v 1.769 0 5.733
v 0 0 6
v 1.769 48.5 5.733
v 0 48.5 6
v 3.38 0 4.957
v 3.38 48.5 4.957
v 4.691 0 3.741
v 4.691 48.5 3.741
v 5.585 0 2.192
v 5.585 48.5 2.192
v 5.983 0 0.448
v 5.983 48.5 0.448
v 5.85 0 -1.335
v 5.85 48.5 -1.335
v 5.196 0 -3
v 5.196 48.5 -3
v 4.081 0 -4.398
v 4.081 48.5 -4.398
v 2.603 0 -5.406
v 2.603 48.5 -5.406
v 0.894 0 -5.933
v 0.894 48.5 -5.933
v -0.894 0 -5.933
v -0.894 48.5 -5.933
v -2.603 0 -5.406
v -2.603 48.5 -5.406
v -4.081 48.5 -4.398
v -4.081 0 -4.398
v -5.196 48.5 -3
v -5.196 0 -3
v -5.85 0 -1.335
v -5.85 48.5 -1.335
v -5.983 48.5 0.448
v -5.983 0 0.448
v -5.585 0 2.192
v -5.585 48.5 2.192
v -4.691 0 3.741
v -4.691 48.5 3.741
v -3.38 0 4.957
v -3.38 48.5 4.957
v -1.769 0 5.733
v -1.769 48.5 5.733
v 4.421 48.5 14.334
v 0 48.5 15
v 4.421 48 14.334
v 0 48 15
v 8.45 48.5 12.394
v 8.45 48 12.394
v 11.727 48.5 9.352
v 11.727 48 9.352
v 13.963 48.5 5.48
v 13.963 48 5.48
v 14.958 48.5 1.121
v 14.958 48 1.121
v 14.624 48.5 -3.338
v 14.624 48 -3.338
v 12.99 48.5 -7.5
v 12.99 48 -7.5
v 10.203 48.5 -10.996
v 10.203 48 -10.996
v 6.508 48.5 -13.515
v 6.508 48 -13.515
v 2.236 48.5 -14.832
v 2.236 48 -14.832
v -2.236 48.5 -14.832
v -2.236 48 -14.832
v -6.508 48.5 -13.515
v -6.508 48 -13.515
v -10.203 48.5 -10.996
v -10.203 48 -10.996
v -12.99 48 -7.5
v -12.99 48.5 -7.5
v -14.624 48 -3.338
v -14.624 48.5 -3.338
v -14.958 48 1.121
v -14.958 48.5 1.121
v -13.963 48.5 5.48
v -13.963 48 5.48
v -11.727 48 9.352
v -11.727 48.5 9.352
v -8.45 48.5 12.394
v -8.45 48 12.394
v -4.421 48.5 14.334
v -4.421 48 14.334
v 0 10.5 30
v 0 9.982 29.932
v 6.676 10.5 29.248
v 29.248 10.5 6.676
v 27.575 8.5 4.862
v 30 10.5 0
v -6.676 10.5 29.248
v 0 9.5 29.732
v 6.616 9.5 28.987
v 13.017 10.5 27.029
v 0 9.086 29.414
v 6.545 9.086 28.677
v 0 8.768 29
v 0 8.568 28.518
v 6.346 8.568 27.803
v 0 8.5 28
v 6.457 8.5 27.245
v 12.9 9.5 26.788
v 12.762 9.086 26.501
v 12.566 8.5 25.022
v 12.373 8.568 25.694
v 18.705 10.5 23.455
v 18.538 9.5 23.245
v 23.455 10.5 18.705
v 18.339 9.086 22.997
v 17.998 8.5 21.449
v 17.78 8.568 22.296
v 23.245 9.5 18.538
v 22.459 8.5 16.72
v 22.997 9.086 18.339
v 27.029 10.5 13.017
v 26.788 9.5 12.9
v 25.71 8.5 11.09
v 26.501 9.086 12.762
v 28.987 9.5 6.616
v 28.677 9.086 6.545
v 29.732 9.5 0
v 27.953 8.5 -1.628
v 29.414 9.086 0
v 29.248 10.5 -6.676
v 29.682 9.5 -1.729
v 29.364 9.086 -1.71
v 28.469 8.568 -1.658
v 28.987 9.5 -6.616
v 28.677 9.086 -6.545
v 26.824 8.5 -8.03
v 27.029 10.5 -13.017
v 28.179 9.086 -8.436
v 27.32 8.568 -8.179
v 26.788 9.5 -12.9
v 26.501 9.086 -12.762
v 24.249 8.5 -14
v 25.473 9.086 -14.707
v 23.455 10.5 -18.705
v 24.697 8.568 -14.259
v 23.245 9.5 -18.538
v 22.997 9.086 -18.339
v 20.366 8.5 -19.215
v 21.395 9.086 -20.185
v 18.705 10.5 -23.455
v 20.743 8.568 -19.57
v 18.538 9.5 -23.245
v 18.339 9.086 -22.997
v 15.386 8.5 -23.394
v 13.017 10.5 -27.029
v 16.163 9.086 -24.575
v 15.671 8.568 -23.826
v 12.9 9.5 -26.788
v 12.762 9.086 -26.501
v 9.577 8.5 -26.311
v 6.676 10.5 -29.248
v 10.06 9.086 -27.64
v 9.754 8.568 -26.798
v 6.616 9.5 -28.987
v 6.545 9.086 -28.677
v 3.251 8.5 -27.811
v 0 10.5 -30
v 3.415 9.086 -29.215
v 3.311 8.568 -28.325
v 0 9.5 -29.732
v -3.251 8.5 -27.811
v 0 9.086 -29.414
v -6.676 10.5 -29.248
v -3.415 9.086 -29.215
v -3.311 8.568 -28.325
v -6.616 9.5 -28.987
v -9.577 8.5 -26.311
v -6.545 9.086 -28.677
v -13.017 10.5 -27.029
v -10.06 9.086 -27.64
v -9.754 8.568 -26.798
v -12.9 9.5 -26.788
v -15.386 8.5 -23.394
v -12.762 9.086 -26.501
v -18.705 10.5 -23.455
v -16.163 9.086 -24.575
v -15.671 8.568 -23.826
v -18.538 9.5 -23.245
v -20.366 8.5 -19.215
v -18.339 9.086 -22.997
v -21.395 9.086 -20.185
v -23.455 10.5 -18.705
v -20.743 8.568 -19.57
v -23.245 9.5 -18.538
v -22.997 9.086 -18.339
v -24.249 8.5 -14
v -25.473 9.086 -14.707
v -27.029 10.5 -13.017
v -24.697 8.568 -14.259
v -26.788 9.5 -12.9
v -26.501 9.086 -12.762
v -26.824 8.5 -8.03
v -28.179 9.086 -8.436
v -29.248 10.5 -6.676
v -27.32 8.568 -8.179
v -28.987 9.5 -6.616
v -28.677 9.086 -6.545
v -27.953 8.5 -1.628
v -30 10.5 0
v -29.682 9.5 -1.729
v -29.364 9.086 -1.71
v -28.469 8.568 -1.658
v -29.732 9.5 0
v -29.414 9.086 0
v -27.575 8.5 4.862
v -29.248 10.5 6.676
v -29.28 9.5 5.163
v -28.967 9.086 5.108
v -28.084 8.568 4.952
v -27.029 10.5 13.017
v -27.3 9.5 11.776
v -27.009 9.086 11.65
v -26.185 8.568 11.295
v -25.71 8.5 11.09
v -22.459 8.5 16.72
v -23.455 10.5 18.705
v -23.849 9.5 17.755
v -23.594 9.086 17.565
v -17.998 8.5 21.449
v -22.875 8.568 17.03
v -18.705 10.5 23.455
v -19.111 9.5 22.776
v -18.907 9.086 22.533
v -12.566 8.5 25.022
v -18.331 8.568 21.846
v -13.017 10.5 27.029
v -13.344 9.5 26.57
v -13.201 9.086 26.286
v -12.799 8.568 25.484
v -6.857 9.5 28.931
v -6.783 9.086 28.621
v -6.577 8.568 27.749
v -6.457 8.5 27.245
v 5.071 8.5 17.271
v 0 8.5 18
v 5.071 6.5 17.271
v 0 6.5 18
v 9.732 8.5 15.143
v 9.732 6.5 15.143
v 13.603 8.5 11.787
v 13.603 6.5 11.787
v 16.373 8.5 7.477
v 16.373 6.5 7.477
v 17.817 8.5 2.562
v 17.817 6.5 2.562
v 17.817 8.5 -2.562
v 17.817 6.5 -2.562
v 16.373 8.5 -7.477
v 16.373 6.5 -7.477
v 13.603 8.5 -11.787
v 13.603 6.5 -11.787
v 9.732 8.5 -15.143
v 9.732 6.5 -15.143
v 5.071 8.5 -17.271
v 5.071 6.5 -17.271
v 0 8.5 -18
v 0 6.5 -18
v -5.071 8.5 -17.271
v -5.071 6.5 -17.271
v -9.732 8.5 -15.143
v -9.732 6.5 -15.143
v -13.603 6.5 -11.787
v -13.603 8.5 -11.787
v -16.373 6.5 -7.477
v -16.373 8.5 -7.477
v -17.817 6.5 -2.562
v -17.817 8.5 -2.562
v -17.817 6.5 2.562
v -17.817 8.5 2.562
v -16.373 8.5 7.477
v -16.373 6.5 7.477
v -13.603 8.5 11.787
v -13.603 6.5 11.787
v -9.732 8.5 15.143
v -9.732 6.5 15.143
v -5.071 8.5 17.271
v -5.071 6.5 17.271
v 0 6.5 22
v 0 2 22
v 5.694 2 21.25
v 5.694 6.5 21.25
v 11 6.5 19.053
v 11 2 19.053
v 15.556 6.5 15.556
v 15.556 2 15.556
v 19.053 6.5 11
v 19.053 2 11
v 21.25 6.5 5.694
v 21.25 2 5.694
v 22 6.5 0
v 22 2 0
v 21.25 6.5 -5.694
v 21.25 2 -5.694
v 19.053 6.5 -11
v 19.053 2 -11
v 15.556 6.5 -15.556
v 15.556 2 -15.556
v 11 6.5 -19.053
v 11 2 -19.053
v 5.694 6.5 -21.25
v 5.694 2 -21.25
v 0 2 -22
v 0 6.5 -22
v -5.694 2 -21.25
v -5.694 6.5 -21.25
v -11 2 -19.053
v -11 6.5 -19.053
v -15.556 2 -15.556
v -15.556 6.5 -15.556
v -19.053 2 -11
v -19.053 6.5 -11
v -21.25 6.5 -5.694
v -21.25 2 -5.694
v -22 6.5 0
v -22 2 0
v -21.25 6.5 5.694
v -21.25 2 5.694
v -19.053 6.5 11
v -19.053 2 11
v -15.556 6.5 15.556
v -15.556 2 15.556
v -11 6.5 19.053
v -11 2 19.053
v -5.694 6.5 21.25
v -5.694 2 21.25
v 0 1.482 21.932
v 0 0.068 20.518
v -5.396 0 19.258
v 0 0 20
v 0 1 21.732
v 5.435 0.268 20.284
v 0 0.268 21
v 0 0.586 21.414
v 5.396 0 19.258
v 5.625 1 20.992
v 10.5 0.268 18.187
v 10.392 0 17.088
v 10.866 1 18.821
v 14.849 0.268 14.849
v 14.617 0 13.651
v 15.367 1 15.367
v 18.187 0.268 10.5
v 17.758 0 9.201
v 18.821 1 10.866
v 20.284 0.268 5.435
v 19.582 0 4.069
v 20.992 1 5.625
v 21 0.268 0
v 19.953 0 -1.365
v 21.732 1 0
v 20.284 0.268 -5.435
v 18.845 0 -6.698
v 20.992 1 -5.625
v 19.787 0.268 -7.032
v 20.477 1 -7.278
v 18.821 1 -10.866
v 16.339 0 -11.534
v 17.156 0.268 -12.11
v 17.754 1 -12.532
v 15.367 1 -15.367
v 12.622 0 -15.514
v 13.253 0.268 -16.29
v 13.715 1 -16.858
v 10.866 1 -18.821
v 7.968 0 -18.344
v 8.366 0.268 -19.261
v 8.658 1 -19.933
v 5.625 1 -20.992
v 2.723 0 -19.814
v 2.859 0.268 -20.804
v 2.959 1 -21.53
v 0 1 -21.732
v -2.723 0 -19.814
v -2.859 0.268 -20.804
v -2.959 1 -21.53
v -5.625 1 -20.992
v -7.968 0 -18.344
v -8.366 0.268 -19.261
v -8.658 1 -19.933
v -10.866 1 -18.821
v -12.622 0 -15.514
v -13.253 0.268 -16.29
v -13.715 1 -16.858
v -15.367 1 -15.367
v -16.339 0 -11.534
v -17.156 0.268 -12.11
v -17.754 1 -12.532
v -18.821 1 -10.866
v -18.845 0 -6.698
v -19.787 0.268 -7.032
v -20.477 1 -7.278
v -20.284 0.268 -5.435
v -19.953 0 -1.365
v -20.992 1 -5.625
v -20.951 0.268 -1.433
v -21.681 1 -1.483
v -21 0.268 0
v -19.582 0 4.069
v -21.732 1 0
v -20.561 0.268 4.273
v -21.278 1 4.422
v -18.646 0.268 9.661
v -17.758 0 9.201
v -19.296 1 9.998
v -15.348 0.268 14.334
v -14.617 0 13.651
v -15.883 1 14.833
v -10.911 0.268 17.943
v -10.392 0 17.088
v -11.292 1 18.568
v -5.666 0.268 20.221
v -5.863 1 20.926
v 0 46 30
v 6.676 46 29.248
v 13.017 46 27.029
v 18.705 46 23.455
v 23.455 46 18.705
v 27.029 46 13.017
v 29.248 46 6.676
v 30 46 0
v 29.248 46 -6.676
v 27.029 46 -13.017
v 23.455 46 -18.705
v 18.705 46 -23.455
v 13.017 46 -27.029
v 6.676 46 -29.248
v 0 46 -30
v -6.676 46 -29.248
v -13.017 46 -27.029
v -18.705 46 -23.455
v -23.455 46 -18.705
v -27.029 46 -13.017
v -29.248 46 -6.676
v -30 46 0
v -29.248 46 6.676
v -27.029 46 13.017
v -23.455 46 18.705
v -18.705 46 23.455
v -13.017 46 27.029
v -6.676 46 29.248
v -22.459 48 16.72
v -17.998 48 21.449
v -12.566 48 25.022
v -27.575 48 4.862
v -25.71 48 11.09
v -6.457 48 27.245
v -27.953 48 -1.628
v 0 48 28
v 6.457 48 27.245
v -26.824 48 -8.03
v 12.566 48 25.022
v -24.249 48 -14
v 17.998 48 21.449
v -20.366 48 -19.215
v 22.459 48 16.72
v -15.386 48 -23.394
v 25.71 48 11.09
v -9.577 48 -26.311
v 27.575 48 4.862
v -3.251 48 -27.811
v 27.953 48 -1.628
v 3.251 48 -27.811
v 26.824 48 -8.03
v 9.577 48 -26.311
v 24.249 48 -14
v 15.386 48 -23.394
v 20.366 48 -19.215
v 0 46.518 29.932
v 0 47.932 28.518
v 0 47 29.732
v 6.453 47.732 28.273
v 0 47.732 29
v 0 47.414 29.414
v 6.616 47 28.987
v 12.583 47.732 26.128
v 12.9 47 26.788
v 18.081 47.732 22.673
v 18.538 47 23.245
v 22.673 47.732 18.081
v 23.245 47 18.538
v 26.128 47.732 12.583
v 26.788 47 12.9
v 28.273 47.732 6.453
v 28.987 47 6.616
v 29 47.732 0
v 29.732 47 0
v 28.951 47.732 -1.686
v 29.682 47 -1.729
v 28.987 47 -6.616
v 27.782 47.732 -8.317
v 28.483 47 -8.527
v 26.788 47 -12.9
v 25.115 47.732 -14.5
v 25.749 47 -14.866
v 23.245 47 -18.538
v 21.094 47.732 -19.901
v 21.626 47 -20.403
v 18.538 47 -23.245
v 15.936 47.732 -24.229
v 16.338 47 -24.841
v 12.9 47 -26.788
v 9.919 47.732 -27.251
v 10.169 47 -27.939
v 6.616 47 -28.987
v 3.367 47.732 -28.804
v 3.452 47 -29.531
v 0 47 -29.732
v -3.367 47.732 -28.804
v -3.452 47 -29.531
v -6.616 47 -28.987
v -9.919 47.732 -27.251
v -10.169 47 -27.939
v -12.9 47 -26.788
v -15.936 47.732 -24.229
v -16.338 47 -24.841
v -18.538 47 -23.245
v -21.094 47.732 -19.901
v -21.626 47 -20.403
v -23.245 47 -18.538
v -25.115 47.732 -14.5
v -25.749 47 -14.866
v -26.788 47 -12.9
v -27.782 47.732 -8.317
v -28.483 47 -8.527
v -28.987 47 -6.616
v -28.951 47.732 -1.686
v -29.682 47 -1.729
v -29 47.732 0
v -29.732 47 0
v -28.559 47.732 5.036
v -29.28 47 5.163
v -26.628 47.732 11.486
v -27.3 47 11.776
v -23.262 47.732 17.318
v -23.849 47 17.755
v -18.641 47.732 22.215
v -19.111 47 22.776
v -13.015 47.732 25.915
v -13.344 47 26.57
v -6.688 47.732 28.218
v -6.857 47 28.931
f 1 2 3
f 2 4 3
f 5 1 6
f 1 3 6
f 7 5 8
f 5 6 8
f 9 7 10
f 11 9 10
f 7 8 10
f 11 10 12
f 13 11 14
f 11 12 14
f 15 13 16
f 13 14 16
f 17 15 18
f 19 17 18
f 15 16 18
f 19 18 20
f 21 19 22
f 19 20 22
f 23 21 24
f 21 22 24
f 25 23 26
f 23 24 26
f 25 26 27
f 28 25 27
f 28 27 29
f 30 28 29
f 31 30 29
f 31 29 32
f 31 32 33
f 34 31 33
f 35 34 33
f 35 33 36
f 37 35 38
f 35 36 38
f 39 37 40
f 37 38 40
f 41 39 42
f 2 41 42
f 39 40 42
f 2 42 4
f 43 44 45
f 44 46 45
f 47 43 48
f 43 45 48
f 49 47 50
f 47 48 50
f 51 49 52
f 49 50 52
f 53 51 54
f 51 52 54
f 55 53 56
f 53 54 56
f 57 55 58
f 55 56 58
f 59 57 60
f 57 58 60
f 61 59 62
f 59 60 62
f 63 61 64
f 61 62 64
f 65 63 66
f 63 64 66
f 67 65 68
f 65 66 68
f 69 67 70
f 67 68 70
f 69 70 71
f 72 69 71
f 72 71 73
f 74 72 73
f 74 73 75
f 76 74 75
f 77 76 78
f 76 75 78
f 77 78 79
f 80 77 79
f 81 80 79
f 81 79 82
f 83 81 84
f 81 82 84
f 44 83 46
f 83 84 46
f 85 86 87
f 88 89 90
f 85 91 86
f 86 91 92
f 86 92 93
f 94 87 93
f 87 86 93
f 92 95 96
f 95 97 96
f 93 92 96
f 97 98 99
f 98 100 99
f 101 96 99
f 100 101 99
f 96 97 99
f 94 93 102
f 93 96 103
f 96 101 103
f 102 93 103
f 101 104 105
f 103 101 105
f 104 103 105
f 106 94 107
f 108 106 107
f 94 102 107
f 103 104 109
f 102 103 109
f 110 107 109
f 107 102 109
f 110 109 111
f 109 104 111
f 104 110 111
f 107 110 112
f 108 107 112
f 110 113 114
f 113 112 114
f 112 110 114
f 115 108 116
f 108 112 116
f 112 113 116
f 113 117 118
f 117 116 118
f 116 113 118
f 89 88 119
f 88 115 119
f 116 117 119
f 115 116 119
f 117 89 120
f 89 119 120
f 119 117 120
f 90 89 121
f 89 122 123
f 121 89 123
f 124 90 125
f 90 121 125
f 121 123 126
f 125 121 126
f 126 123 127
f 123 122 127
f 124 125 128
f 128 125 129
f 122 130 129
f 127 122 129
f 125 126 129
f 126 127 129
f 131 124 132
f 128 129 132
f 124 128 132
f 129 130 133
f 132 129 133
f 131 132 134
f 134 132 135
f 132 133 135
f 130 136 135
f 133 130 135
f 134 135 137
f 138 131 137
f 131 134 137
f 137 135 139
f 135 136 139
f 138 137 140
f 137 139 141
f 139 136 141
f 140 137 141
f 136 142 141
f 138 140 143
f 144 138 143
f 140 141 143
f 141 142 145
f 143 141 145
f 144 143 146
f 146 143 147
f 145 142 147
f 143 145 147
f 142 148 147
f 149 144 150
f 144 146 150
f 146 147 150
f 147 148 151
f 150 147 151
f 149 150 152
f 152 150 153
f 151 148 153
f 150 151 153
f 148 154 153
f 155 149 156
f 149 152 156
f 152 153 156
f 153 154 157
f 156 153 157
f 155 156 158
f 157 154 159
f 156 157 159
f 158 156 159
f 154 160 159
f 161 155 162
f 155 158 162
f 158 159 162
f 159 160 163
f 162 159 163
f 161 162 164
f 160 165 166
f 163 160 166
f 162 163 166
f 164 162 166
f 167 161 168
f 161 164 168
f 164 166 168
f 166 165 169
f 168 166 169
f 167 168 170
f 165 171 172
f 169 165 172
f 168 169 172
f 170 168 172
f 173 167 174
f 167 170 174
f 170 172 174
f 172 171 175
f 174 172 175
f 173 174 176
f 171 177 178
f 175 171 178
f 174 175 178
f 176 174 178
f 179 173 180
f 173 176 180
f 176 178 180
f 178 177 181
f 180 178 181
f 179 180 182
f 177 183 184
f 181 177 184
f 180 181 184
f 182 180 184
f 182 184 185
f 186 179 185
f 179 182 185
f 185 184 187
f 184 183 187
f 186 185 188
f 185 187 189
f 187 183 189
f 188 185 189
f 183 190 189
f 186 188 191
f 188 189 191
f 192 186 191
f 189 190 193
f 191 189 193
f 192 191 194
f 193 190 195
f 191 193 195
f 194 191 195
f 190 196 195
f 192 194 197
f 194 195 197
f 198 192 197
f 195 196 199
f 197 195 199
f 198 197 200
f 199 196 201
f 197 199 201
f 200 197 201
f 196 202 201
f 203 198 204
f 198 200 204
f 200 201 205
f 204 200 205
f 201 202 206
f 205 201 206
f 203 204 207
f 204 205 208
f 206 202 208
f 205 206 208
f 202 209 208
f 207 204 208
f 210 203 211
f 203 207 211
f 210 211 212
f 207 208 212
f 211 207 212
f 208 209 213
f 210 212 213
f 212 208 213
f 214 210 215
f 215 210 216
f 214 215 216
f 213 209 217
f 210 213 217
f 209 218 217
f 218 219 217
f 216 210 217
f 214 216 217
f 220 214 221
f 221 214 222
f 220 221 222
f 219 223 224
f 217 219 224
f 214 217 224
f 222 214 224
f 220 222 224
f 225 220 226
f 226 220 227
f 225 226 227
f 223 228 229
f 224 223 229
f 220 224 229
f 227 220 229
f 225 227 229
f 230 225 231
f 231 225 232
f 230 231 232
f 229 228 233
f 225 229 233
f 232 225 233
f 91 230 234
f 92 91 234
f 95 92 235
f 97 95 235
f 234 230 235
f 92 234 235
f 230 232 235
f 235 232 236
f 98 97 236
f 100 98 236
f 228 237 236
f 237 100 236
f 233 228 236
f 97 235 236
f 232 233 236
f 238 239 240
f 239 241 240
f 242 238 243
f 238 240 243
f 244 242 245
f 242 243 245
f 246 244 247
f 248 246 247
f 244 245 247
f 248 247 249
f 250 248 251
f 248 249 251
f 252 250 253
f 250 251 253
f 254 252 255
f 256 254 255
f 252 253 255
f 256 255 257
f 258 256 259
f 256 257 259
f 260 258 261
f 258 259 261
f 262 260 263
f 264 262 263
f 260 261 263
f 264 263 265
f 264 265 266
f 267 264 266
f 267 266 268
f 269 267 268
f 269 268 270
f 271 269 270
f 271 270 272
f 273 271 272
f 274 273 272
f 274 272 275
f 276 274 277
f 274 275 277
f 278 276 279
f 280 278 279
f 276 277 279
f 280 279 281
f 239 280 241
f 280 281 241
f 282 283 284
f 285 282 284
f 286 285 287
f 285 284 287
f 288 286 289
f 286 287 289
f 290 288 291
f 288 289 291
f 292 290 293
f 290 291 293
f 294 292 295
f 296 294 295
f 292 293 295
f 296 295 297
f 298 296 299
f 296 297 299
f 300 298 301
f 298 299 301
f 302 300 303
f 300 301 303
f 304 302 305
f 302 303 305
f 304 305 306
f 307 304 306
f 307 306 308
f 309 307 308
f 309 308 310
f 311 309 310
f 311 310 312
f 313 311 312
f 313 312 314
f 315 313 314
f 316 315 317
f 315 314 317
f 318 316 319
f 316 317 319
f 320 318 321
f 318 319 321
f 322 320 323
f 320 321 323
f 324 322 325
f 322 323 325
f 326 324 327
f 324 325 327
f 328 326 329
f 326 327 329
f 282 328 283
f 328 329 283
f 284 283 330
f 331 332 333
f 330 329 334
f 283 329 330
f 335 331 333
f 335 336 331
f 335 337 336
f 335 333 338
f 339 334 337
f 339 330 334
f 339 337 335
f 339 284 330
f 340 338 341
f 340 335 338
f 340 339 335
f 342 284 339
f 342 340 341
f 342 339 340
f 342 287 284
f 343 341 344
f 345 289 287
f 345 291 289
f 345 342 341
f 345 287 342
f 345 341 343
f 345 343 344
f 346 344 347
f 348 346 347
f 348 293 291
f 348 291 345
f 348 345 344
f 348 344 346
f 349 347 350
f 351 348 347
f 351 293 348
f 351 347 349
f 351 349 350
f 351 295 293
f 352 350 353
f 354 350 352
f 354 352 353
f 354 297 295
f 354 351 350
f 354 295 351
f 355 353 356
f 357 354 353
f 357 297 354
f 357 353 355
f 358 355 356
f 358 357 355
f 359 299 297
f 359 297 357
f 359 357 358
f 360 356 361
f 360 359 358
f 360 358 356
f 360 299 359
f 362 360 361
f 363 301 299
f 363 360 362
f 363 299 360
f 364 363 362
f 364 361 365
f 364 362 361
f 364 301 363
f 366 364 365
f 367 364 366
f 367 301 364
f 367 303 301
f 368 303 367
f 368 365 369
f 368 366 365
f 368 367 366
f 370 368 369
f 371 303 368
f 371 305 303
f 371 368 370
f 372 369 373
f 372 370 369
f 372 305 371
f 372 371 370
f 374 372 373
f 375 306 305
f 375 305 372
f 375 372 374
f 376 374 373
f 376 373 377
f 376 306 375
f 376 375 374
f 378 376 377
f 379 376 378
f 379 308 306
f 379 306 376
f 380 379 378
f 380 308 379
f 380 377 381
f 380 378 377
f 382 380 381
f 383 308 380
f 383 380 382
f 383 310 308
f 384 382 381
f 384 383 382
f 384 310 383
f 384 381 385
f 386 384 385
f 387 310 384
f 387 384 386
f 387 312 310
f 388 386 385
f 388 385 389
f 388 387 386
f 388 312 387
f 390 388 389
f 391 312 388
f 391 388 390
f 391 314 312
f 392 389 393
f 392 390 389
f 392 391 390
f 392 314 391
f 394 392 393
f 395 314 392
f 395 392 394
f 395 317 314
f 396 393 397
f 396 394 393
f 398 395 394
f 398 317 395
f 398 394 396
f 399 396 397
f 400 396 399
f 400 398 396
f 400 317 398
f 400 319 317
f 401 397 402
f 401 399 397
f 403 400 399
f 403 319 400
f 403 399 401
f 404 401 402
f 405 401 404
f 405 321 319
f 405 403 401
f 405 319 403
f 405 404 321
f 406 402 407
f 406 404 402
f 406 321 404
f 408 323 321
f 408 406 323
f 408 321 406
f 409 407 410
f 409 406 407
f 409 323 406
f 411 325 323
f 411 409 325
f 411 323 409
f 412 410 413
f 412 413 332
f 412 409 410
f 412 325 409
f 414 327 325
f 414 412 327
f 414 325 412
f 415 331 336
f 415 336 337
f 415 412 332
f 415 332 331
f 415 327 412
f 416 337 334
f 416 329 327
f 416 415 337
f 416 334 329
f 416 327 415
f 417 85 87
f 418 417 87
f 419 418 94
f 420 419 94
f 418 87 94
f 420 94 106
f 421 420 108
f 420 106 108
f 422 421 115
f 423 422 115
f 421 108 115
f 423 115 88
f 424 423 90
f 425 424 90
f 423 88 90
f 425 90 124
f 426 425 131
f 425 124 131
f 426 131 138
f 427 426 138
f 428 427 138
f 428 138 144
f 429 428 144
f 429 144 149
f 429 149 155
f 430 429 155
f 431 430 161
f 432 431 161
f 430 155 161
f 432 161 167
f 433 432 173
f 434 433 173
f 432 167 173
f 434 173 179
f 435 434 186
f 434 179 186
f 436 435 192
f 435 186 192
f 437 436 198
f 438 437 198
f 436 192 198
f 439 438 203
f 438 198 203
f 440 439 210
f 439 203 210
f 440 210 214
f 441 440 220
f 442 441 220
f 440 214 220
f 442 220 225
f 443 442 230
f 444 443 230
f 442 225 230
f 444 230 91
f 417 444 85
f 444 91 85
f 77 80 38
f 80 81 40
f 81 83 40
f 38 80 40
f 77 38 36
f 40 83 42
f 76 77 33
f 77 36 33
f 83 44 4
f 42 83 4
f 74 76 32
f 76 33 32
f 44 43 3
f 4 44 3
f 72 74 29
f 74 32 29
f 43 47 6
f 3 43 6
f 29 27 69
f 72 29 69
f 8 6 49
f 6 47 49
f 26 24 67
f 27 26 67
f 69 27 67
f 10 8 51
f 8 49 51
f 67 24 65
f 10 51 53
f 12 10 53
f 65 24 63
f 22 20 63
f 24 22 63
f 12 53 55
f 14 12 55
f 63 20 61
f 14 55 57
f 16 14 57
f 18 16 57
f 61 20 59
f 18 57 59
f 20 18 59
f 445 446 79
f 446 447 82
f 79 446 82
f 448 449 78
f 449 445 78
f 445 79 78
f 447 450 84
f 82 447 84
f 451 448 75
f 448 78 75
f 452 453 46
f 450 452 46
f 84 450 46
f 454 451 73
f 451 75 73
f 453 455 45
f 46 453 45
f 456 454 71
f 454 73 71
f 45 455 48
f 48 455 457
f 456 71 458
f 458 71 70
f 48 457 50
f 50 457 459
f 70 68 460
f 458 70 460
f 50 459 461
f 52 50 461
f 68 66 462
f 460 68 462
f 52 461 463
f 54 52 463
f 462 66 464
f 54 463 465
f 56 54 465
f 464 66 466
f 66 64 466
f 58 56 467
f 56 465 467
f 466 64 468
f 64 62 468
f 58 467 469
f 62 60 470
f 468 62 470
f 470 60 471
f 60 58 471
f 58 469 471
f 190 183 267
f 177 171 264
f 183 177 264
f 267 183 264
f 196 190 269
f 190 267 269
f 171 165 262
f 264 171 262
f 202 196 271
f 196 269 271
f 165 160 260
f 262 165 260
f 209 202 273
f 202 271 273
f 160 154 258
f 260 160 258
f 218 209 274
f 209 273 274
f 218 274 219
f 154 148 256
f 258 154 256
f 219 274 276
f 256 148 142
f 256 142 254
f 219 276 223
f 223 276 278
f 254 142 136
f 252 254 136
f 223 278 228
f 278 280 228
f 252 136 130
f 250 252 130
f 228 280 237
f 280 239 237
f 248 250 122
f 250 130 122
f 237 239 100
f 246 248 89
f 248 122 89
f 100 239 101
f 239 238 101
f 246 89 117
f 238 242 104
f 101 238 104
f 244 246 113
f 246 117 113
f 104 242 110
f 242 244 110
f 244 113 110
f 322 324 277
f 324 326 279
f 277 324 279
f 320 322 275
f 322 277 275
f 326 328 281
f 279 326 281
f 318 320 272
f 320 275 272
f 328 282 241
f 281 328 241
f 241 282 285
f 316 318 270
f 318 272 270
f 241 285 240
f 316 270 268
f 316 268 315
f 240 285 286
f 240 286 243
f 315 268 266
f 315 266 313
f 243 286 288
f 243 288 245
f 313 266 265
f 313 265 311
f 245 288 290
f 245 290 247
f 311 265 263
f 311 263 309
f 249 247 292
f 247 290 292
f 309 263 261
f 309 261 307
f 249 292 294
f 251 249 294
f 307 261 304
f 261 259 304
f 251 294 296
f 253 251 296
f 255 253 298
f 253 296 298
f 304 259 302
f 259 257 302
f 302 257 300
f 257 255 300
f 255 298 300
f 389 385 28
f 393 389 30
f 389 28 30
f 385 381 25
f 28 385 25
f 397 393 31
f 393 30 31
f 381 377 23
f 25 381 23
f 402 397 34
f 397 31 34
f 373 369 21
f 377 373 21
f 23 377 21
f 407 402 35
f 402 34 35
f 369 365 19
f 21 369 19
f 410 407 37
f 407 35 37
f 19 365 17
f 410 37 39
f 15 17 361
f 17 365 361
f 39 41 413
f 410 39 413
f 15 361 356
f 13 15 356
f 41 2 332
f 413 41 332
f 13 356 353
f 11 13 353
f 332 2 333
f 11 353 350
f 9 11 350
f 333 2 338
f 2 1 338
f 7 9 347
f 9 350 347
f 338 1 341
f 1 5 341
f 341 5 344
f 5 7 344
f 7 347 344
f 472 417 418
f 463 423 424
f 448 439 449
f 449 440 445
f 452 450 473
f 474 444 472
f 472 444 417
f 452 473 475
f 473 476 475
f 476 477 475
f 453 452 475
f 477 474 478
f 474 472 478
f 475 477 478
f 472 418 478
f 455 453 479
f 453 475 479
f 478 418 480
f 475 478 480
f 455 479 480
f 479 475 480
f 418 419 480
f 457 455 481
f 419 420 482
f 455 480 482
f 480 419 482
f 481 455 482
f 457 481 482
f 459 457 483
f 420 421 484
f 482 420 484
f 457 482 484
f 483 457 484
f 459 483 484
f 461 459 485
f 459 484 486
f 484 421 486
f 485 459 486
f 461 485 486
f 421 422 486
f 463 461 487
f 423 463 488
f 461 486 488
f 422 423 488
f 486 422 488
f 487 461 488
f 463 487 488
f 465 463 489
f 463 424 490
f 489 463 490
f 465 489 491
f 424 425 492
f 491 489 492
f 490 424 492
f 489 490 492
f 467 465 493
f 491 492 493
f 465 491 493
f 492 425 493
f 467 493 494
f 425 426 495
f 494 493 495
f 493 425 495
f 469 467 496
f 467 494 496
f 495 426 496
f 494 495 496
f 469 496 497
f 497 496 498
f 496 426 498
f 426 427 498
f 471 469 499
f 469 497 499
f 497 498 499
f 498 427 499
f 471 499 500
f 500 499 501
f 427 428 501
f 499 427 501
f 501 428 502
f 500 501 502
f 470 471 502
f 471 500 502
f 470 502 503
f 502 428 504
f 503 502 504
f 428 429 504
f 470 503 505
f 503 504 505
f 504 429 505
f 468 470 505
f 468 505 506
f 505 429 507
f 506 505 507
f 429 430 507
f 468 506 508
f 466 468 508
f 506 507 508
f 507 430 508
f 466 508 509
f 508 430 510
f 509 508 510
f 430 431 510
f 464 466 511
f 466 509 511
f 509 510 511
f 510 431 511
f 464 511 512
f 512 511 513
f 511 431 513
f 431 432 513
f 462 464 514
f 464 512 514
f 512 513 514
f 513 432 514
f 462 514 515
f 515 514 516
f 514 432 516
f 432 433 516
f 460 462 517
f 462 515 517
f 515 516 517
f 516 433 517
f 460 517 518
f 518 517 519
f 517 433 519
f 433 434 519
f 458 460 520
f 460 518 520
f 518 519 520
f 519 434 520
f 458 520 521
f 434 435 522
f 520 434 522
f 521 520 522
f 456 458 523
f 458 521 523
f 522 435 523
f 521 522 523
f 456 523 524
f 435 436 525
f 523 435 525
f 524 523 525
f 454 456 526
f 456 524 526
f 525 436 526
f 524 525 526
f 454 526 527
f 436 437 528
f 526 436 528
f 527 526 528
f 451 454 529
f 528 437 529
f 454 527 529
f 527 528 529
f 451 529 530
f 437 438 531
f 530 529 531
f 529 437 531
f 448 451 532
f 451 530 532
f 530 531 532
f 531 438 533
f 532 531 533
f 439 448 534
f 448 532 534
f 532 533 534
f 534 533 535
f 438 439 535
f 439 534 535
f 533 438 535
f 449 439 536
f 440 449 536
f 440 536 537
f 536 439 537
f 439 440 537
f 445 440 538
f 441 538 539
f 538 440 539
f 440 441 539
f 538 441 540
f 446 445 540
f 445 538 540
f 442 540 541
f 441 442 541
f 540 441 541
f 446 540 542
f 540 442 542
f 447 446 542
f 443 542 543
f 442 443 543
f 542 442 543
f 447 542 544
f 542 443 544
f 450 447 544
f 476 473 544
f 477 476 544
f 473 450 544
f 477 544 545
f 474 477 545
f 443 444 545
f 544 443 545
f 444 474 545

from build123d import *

# Parameters (mm, degrees)
F2_R = 2


with BuildPart() as f1:
    # F0 (on Right) → F1 (revolve)
    with BuildSketch(Plane.YZ):
        Polygon((0, 22), (0, 6), (48.5, 6), (48.5, 15), (48, 15), (48, 30), (8.5, 30), (8.5, 18), (6.5, 18), (6.5, 22), align=None)
    revolve(axis=Axis((0, 19.820221, 0), (0, 1, 0)))

    # F2
    f2_edges = [f1.edges().sort_by_distance(p)[0] for p in [
        (0, 0, -22),
        (0, 8.5, -30),
        (0, 48, -30),
    ]]
    fillet(f2_edges, radius=F2_R)


solid = f1.part
